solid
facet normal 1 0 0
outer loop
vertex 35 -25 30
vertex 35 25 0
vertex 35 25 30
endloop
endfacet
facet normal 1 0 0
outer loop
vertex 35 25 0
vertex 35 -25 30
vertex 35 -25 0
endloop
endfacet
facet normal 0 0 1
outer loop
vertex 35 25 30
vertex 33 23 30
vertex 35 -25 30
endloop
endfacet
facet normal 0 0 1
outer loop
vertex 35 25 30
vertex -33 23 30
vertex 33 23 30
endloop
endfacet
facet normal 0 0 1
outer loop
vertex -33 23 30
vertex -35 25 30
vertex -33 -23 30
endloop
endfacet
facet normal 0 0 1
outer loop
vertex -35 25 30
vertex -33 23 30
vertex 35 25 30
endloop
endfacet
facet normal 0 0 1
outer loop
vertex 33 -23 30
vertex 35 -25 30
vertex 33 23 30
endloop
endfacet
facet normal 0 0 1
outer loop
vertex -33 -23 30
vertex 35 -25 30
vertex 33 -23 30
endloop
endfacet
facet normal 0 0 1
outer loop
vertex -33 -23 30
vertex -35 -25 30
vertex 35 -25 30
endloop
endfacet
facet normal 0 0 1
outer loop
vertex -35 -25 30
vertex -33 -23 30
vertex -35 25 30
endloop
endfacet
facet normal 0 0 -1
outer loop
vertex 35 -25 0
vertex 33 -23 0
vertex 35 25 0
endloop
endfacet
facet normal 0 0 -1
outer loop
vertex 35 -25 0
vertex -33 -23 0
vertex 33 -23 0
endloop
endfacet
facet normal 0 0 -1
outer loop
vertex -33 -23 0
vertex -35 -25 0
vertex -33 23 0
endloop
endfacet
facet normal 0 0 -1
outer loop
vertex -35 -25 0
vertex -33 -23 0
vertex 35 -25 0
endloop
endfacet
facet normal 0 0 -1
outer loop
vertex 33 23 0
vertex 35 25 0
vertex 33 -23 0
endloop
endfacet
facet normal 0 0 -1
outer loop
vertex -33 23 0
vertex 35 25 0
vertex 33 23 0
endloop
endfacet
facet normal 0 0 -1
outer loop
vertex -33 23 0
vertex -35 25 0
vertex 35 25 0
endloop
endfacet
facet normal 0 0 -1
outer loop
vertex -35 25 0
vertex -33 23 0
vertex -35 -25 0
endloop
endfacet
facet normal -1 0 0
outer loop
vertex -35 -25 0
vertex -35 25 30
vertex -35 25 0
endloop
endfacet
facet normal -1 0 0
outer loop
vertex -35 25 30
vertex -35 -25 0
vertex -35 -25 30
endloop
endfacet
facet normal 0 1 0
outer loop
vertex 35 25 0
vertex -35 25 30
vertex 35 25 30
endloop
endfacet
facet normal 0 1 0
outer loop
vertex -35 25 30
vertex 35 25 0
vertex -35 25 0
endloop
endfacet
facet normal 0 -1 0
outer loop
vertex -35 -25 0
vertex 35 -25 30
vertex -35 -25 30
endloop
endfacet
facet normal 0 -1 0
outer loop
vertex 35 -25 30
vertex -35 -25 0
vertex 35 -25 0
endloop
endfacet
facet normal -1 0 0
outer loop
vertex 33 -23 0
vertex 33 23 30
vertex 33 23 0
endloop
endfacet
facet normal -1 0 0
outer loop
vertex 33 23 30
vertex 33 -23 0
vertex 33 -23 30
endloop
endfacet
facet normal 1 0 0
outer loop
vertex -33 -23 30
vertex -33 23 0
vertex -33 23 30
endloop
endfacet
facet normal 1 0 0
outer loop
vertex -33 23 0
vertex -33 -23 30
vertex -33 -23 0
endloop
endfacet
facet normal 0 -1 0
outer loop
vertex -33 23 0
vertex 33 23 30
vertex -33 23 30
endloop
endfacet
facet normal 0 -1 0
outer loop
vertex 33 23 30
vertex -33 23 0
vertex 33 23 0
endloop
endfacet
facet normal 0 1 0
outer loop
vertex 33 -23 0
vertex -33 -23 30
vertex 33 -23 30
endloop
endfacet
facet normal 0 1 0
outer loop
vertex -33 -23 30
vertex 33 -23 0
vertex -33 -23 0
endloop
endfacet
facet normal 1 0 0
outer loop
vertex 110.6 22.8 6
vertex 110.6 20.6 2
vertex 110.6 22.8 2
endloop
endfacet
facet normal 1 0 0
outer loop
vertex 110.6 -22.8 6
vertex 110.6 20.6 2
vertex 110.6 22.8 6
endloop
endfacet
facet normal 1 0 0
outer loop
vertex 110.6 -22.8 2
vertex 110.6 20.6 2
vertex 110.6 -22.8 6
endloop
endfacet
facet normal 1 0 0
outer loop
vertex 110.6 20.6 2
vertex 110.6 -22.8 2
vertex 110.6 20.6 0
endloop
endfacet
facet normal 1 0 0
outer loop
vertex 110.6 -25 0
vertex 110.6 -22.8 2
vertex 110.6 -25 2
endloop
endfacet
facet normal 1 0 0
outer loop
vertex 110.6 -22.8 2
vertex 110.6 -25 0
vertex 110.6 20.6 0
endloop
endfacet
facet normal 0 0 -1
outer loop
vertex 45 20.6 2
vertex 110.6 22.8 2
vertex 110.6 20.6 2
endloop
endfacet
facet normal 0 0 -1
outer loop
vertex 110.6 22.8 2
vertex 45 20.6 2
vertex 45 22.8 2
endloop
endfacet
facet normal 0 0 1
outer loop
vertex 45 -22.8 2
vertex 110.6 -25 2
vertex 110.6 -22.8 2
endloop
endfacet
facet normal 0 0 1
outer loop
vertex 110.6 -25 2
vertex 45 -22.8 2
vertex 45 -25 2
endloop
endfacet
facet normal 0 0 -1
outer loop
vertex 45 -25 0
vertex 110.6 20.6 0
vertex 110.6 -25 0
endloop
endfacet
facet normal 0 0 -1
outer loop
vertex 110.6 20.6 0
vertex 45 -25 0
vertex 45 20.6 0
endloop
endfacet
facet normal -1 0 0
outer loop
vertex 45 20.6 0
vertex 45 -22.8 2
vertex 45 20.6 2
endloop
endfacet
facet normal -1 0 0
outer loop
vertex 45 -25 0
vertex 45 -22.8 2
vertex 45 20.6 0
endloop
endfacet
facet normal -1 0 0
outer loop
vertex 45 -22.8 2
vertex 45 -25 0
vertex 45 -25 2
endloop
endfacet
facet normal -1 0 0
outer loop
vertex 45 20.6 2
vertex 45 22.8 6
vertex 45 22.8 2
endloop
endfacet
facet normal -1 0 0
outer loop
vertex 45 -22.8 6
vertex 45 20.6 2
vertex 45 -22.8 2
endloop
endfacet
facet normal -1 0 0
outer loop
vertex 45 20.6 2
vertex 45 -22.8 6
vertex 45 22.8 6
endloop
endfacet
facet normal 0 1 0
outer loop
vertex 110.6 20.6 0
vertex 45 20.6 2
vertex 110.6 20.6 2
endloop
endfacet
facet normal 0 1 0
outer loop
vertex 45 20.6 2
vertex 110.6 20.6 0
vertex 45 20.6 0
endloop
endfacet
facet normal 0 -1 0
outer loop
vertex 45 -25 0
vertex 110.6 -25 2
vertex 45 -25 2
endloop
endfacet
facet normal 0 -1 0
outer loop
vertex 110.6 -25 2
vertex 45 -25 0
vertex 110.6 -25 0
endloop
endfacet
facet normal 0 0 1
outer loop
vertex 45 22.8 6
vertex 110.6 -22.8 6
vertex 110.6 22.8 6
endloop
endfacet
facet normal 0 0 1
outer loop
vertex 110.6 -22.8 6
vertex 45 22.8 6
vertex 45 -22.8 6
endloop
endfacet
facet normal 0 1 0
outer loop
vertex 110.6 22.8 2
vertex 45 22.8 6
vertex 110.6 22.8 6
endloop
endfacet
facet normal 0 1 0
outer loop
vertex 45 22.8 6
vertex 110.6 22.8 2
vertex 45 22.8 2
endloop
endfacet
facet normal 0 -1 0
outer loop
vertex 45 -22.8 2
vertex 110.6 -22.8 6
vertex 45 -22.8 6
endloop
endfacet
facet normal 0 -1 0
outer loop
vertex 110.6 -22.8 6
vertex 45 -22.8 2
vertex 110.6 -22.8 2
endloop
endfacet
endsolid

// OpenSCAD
// Two-part enclosure for a small electronics board (e.g. Arduino-based logger)
// Print orientation: box standing on the bed, lid plate flat on the bed.

$fn = 64;

// ---- Dimensions (mm) ----
box_x      = 70;    // outer length of box
box_y      = 50;    // outer width of box
box_z      = 30;    // outer height of box
box_wall   = 2;     // box wall thickness
box_floor  = 2;     // box floor thickness

gap        = 10;    // clear gap between the two parts

lip_x      = 65.6;  // outer length of lid lip
lip_y      = 45.6;  // outer width of lid lip
lip_t      = 1.5;   // lid lip wall thickness
lip_h      = 4;     // lid lip height above plate

eps        = 0.5;   // cutter overshoot

// ---- Derived ----
box_inner_x = box_x - 2*box_wall;
box_inner_y = box_y - 2*box_wall;
plate_t     = 2;    // lid plate thickness

// ---- Model ----
union() {
    // Box: open-top, centred in XY, resting on z = 0
    difference() {
        translate([-box_x/2, -box_y/2, 0])
            cube([box_x, box_y, box_z]);
        // hollow interior (extends past the open top)
        translate([-box_inner_x/2, -box_inner_y/2, -eps])
            cube([box_inner_x, box_inner_y, box_z + 2*eps]);
    }

    // Lid: plate with a rectangular lip on top, printed upside down
    union() {
        // base plate
        translate([box_x/2 + gap, -box_y/2, 0])
            cube([lip_x, lip_y, plate_t]);
        // lip: outer size 65.6 x 45.6, wall 1.5, height 4
        translate([box_x/2 + gap, -lip_y/2, plate_t])
            cube([lip_x, lip_y, lip_h]);
    }
}
